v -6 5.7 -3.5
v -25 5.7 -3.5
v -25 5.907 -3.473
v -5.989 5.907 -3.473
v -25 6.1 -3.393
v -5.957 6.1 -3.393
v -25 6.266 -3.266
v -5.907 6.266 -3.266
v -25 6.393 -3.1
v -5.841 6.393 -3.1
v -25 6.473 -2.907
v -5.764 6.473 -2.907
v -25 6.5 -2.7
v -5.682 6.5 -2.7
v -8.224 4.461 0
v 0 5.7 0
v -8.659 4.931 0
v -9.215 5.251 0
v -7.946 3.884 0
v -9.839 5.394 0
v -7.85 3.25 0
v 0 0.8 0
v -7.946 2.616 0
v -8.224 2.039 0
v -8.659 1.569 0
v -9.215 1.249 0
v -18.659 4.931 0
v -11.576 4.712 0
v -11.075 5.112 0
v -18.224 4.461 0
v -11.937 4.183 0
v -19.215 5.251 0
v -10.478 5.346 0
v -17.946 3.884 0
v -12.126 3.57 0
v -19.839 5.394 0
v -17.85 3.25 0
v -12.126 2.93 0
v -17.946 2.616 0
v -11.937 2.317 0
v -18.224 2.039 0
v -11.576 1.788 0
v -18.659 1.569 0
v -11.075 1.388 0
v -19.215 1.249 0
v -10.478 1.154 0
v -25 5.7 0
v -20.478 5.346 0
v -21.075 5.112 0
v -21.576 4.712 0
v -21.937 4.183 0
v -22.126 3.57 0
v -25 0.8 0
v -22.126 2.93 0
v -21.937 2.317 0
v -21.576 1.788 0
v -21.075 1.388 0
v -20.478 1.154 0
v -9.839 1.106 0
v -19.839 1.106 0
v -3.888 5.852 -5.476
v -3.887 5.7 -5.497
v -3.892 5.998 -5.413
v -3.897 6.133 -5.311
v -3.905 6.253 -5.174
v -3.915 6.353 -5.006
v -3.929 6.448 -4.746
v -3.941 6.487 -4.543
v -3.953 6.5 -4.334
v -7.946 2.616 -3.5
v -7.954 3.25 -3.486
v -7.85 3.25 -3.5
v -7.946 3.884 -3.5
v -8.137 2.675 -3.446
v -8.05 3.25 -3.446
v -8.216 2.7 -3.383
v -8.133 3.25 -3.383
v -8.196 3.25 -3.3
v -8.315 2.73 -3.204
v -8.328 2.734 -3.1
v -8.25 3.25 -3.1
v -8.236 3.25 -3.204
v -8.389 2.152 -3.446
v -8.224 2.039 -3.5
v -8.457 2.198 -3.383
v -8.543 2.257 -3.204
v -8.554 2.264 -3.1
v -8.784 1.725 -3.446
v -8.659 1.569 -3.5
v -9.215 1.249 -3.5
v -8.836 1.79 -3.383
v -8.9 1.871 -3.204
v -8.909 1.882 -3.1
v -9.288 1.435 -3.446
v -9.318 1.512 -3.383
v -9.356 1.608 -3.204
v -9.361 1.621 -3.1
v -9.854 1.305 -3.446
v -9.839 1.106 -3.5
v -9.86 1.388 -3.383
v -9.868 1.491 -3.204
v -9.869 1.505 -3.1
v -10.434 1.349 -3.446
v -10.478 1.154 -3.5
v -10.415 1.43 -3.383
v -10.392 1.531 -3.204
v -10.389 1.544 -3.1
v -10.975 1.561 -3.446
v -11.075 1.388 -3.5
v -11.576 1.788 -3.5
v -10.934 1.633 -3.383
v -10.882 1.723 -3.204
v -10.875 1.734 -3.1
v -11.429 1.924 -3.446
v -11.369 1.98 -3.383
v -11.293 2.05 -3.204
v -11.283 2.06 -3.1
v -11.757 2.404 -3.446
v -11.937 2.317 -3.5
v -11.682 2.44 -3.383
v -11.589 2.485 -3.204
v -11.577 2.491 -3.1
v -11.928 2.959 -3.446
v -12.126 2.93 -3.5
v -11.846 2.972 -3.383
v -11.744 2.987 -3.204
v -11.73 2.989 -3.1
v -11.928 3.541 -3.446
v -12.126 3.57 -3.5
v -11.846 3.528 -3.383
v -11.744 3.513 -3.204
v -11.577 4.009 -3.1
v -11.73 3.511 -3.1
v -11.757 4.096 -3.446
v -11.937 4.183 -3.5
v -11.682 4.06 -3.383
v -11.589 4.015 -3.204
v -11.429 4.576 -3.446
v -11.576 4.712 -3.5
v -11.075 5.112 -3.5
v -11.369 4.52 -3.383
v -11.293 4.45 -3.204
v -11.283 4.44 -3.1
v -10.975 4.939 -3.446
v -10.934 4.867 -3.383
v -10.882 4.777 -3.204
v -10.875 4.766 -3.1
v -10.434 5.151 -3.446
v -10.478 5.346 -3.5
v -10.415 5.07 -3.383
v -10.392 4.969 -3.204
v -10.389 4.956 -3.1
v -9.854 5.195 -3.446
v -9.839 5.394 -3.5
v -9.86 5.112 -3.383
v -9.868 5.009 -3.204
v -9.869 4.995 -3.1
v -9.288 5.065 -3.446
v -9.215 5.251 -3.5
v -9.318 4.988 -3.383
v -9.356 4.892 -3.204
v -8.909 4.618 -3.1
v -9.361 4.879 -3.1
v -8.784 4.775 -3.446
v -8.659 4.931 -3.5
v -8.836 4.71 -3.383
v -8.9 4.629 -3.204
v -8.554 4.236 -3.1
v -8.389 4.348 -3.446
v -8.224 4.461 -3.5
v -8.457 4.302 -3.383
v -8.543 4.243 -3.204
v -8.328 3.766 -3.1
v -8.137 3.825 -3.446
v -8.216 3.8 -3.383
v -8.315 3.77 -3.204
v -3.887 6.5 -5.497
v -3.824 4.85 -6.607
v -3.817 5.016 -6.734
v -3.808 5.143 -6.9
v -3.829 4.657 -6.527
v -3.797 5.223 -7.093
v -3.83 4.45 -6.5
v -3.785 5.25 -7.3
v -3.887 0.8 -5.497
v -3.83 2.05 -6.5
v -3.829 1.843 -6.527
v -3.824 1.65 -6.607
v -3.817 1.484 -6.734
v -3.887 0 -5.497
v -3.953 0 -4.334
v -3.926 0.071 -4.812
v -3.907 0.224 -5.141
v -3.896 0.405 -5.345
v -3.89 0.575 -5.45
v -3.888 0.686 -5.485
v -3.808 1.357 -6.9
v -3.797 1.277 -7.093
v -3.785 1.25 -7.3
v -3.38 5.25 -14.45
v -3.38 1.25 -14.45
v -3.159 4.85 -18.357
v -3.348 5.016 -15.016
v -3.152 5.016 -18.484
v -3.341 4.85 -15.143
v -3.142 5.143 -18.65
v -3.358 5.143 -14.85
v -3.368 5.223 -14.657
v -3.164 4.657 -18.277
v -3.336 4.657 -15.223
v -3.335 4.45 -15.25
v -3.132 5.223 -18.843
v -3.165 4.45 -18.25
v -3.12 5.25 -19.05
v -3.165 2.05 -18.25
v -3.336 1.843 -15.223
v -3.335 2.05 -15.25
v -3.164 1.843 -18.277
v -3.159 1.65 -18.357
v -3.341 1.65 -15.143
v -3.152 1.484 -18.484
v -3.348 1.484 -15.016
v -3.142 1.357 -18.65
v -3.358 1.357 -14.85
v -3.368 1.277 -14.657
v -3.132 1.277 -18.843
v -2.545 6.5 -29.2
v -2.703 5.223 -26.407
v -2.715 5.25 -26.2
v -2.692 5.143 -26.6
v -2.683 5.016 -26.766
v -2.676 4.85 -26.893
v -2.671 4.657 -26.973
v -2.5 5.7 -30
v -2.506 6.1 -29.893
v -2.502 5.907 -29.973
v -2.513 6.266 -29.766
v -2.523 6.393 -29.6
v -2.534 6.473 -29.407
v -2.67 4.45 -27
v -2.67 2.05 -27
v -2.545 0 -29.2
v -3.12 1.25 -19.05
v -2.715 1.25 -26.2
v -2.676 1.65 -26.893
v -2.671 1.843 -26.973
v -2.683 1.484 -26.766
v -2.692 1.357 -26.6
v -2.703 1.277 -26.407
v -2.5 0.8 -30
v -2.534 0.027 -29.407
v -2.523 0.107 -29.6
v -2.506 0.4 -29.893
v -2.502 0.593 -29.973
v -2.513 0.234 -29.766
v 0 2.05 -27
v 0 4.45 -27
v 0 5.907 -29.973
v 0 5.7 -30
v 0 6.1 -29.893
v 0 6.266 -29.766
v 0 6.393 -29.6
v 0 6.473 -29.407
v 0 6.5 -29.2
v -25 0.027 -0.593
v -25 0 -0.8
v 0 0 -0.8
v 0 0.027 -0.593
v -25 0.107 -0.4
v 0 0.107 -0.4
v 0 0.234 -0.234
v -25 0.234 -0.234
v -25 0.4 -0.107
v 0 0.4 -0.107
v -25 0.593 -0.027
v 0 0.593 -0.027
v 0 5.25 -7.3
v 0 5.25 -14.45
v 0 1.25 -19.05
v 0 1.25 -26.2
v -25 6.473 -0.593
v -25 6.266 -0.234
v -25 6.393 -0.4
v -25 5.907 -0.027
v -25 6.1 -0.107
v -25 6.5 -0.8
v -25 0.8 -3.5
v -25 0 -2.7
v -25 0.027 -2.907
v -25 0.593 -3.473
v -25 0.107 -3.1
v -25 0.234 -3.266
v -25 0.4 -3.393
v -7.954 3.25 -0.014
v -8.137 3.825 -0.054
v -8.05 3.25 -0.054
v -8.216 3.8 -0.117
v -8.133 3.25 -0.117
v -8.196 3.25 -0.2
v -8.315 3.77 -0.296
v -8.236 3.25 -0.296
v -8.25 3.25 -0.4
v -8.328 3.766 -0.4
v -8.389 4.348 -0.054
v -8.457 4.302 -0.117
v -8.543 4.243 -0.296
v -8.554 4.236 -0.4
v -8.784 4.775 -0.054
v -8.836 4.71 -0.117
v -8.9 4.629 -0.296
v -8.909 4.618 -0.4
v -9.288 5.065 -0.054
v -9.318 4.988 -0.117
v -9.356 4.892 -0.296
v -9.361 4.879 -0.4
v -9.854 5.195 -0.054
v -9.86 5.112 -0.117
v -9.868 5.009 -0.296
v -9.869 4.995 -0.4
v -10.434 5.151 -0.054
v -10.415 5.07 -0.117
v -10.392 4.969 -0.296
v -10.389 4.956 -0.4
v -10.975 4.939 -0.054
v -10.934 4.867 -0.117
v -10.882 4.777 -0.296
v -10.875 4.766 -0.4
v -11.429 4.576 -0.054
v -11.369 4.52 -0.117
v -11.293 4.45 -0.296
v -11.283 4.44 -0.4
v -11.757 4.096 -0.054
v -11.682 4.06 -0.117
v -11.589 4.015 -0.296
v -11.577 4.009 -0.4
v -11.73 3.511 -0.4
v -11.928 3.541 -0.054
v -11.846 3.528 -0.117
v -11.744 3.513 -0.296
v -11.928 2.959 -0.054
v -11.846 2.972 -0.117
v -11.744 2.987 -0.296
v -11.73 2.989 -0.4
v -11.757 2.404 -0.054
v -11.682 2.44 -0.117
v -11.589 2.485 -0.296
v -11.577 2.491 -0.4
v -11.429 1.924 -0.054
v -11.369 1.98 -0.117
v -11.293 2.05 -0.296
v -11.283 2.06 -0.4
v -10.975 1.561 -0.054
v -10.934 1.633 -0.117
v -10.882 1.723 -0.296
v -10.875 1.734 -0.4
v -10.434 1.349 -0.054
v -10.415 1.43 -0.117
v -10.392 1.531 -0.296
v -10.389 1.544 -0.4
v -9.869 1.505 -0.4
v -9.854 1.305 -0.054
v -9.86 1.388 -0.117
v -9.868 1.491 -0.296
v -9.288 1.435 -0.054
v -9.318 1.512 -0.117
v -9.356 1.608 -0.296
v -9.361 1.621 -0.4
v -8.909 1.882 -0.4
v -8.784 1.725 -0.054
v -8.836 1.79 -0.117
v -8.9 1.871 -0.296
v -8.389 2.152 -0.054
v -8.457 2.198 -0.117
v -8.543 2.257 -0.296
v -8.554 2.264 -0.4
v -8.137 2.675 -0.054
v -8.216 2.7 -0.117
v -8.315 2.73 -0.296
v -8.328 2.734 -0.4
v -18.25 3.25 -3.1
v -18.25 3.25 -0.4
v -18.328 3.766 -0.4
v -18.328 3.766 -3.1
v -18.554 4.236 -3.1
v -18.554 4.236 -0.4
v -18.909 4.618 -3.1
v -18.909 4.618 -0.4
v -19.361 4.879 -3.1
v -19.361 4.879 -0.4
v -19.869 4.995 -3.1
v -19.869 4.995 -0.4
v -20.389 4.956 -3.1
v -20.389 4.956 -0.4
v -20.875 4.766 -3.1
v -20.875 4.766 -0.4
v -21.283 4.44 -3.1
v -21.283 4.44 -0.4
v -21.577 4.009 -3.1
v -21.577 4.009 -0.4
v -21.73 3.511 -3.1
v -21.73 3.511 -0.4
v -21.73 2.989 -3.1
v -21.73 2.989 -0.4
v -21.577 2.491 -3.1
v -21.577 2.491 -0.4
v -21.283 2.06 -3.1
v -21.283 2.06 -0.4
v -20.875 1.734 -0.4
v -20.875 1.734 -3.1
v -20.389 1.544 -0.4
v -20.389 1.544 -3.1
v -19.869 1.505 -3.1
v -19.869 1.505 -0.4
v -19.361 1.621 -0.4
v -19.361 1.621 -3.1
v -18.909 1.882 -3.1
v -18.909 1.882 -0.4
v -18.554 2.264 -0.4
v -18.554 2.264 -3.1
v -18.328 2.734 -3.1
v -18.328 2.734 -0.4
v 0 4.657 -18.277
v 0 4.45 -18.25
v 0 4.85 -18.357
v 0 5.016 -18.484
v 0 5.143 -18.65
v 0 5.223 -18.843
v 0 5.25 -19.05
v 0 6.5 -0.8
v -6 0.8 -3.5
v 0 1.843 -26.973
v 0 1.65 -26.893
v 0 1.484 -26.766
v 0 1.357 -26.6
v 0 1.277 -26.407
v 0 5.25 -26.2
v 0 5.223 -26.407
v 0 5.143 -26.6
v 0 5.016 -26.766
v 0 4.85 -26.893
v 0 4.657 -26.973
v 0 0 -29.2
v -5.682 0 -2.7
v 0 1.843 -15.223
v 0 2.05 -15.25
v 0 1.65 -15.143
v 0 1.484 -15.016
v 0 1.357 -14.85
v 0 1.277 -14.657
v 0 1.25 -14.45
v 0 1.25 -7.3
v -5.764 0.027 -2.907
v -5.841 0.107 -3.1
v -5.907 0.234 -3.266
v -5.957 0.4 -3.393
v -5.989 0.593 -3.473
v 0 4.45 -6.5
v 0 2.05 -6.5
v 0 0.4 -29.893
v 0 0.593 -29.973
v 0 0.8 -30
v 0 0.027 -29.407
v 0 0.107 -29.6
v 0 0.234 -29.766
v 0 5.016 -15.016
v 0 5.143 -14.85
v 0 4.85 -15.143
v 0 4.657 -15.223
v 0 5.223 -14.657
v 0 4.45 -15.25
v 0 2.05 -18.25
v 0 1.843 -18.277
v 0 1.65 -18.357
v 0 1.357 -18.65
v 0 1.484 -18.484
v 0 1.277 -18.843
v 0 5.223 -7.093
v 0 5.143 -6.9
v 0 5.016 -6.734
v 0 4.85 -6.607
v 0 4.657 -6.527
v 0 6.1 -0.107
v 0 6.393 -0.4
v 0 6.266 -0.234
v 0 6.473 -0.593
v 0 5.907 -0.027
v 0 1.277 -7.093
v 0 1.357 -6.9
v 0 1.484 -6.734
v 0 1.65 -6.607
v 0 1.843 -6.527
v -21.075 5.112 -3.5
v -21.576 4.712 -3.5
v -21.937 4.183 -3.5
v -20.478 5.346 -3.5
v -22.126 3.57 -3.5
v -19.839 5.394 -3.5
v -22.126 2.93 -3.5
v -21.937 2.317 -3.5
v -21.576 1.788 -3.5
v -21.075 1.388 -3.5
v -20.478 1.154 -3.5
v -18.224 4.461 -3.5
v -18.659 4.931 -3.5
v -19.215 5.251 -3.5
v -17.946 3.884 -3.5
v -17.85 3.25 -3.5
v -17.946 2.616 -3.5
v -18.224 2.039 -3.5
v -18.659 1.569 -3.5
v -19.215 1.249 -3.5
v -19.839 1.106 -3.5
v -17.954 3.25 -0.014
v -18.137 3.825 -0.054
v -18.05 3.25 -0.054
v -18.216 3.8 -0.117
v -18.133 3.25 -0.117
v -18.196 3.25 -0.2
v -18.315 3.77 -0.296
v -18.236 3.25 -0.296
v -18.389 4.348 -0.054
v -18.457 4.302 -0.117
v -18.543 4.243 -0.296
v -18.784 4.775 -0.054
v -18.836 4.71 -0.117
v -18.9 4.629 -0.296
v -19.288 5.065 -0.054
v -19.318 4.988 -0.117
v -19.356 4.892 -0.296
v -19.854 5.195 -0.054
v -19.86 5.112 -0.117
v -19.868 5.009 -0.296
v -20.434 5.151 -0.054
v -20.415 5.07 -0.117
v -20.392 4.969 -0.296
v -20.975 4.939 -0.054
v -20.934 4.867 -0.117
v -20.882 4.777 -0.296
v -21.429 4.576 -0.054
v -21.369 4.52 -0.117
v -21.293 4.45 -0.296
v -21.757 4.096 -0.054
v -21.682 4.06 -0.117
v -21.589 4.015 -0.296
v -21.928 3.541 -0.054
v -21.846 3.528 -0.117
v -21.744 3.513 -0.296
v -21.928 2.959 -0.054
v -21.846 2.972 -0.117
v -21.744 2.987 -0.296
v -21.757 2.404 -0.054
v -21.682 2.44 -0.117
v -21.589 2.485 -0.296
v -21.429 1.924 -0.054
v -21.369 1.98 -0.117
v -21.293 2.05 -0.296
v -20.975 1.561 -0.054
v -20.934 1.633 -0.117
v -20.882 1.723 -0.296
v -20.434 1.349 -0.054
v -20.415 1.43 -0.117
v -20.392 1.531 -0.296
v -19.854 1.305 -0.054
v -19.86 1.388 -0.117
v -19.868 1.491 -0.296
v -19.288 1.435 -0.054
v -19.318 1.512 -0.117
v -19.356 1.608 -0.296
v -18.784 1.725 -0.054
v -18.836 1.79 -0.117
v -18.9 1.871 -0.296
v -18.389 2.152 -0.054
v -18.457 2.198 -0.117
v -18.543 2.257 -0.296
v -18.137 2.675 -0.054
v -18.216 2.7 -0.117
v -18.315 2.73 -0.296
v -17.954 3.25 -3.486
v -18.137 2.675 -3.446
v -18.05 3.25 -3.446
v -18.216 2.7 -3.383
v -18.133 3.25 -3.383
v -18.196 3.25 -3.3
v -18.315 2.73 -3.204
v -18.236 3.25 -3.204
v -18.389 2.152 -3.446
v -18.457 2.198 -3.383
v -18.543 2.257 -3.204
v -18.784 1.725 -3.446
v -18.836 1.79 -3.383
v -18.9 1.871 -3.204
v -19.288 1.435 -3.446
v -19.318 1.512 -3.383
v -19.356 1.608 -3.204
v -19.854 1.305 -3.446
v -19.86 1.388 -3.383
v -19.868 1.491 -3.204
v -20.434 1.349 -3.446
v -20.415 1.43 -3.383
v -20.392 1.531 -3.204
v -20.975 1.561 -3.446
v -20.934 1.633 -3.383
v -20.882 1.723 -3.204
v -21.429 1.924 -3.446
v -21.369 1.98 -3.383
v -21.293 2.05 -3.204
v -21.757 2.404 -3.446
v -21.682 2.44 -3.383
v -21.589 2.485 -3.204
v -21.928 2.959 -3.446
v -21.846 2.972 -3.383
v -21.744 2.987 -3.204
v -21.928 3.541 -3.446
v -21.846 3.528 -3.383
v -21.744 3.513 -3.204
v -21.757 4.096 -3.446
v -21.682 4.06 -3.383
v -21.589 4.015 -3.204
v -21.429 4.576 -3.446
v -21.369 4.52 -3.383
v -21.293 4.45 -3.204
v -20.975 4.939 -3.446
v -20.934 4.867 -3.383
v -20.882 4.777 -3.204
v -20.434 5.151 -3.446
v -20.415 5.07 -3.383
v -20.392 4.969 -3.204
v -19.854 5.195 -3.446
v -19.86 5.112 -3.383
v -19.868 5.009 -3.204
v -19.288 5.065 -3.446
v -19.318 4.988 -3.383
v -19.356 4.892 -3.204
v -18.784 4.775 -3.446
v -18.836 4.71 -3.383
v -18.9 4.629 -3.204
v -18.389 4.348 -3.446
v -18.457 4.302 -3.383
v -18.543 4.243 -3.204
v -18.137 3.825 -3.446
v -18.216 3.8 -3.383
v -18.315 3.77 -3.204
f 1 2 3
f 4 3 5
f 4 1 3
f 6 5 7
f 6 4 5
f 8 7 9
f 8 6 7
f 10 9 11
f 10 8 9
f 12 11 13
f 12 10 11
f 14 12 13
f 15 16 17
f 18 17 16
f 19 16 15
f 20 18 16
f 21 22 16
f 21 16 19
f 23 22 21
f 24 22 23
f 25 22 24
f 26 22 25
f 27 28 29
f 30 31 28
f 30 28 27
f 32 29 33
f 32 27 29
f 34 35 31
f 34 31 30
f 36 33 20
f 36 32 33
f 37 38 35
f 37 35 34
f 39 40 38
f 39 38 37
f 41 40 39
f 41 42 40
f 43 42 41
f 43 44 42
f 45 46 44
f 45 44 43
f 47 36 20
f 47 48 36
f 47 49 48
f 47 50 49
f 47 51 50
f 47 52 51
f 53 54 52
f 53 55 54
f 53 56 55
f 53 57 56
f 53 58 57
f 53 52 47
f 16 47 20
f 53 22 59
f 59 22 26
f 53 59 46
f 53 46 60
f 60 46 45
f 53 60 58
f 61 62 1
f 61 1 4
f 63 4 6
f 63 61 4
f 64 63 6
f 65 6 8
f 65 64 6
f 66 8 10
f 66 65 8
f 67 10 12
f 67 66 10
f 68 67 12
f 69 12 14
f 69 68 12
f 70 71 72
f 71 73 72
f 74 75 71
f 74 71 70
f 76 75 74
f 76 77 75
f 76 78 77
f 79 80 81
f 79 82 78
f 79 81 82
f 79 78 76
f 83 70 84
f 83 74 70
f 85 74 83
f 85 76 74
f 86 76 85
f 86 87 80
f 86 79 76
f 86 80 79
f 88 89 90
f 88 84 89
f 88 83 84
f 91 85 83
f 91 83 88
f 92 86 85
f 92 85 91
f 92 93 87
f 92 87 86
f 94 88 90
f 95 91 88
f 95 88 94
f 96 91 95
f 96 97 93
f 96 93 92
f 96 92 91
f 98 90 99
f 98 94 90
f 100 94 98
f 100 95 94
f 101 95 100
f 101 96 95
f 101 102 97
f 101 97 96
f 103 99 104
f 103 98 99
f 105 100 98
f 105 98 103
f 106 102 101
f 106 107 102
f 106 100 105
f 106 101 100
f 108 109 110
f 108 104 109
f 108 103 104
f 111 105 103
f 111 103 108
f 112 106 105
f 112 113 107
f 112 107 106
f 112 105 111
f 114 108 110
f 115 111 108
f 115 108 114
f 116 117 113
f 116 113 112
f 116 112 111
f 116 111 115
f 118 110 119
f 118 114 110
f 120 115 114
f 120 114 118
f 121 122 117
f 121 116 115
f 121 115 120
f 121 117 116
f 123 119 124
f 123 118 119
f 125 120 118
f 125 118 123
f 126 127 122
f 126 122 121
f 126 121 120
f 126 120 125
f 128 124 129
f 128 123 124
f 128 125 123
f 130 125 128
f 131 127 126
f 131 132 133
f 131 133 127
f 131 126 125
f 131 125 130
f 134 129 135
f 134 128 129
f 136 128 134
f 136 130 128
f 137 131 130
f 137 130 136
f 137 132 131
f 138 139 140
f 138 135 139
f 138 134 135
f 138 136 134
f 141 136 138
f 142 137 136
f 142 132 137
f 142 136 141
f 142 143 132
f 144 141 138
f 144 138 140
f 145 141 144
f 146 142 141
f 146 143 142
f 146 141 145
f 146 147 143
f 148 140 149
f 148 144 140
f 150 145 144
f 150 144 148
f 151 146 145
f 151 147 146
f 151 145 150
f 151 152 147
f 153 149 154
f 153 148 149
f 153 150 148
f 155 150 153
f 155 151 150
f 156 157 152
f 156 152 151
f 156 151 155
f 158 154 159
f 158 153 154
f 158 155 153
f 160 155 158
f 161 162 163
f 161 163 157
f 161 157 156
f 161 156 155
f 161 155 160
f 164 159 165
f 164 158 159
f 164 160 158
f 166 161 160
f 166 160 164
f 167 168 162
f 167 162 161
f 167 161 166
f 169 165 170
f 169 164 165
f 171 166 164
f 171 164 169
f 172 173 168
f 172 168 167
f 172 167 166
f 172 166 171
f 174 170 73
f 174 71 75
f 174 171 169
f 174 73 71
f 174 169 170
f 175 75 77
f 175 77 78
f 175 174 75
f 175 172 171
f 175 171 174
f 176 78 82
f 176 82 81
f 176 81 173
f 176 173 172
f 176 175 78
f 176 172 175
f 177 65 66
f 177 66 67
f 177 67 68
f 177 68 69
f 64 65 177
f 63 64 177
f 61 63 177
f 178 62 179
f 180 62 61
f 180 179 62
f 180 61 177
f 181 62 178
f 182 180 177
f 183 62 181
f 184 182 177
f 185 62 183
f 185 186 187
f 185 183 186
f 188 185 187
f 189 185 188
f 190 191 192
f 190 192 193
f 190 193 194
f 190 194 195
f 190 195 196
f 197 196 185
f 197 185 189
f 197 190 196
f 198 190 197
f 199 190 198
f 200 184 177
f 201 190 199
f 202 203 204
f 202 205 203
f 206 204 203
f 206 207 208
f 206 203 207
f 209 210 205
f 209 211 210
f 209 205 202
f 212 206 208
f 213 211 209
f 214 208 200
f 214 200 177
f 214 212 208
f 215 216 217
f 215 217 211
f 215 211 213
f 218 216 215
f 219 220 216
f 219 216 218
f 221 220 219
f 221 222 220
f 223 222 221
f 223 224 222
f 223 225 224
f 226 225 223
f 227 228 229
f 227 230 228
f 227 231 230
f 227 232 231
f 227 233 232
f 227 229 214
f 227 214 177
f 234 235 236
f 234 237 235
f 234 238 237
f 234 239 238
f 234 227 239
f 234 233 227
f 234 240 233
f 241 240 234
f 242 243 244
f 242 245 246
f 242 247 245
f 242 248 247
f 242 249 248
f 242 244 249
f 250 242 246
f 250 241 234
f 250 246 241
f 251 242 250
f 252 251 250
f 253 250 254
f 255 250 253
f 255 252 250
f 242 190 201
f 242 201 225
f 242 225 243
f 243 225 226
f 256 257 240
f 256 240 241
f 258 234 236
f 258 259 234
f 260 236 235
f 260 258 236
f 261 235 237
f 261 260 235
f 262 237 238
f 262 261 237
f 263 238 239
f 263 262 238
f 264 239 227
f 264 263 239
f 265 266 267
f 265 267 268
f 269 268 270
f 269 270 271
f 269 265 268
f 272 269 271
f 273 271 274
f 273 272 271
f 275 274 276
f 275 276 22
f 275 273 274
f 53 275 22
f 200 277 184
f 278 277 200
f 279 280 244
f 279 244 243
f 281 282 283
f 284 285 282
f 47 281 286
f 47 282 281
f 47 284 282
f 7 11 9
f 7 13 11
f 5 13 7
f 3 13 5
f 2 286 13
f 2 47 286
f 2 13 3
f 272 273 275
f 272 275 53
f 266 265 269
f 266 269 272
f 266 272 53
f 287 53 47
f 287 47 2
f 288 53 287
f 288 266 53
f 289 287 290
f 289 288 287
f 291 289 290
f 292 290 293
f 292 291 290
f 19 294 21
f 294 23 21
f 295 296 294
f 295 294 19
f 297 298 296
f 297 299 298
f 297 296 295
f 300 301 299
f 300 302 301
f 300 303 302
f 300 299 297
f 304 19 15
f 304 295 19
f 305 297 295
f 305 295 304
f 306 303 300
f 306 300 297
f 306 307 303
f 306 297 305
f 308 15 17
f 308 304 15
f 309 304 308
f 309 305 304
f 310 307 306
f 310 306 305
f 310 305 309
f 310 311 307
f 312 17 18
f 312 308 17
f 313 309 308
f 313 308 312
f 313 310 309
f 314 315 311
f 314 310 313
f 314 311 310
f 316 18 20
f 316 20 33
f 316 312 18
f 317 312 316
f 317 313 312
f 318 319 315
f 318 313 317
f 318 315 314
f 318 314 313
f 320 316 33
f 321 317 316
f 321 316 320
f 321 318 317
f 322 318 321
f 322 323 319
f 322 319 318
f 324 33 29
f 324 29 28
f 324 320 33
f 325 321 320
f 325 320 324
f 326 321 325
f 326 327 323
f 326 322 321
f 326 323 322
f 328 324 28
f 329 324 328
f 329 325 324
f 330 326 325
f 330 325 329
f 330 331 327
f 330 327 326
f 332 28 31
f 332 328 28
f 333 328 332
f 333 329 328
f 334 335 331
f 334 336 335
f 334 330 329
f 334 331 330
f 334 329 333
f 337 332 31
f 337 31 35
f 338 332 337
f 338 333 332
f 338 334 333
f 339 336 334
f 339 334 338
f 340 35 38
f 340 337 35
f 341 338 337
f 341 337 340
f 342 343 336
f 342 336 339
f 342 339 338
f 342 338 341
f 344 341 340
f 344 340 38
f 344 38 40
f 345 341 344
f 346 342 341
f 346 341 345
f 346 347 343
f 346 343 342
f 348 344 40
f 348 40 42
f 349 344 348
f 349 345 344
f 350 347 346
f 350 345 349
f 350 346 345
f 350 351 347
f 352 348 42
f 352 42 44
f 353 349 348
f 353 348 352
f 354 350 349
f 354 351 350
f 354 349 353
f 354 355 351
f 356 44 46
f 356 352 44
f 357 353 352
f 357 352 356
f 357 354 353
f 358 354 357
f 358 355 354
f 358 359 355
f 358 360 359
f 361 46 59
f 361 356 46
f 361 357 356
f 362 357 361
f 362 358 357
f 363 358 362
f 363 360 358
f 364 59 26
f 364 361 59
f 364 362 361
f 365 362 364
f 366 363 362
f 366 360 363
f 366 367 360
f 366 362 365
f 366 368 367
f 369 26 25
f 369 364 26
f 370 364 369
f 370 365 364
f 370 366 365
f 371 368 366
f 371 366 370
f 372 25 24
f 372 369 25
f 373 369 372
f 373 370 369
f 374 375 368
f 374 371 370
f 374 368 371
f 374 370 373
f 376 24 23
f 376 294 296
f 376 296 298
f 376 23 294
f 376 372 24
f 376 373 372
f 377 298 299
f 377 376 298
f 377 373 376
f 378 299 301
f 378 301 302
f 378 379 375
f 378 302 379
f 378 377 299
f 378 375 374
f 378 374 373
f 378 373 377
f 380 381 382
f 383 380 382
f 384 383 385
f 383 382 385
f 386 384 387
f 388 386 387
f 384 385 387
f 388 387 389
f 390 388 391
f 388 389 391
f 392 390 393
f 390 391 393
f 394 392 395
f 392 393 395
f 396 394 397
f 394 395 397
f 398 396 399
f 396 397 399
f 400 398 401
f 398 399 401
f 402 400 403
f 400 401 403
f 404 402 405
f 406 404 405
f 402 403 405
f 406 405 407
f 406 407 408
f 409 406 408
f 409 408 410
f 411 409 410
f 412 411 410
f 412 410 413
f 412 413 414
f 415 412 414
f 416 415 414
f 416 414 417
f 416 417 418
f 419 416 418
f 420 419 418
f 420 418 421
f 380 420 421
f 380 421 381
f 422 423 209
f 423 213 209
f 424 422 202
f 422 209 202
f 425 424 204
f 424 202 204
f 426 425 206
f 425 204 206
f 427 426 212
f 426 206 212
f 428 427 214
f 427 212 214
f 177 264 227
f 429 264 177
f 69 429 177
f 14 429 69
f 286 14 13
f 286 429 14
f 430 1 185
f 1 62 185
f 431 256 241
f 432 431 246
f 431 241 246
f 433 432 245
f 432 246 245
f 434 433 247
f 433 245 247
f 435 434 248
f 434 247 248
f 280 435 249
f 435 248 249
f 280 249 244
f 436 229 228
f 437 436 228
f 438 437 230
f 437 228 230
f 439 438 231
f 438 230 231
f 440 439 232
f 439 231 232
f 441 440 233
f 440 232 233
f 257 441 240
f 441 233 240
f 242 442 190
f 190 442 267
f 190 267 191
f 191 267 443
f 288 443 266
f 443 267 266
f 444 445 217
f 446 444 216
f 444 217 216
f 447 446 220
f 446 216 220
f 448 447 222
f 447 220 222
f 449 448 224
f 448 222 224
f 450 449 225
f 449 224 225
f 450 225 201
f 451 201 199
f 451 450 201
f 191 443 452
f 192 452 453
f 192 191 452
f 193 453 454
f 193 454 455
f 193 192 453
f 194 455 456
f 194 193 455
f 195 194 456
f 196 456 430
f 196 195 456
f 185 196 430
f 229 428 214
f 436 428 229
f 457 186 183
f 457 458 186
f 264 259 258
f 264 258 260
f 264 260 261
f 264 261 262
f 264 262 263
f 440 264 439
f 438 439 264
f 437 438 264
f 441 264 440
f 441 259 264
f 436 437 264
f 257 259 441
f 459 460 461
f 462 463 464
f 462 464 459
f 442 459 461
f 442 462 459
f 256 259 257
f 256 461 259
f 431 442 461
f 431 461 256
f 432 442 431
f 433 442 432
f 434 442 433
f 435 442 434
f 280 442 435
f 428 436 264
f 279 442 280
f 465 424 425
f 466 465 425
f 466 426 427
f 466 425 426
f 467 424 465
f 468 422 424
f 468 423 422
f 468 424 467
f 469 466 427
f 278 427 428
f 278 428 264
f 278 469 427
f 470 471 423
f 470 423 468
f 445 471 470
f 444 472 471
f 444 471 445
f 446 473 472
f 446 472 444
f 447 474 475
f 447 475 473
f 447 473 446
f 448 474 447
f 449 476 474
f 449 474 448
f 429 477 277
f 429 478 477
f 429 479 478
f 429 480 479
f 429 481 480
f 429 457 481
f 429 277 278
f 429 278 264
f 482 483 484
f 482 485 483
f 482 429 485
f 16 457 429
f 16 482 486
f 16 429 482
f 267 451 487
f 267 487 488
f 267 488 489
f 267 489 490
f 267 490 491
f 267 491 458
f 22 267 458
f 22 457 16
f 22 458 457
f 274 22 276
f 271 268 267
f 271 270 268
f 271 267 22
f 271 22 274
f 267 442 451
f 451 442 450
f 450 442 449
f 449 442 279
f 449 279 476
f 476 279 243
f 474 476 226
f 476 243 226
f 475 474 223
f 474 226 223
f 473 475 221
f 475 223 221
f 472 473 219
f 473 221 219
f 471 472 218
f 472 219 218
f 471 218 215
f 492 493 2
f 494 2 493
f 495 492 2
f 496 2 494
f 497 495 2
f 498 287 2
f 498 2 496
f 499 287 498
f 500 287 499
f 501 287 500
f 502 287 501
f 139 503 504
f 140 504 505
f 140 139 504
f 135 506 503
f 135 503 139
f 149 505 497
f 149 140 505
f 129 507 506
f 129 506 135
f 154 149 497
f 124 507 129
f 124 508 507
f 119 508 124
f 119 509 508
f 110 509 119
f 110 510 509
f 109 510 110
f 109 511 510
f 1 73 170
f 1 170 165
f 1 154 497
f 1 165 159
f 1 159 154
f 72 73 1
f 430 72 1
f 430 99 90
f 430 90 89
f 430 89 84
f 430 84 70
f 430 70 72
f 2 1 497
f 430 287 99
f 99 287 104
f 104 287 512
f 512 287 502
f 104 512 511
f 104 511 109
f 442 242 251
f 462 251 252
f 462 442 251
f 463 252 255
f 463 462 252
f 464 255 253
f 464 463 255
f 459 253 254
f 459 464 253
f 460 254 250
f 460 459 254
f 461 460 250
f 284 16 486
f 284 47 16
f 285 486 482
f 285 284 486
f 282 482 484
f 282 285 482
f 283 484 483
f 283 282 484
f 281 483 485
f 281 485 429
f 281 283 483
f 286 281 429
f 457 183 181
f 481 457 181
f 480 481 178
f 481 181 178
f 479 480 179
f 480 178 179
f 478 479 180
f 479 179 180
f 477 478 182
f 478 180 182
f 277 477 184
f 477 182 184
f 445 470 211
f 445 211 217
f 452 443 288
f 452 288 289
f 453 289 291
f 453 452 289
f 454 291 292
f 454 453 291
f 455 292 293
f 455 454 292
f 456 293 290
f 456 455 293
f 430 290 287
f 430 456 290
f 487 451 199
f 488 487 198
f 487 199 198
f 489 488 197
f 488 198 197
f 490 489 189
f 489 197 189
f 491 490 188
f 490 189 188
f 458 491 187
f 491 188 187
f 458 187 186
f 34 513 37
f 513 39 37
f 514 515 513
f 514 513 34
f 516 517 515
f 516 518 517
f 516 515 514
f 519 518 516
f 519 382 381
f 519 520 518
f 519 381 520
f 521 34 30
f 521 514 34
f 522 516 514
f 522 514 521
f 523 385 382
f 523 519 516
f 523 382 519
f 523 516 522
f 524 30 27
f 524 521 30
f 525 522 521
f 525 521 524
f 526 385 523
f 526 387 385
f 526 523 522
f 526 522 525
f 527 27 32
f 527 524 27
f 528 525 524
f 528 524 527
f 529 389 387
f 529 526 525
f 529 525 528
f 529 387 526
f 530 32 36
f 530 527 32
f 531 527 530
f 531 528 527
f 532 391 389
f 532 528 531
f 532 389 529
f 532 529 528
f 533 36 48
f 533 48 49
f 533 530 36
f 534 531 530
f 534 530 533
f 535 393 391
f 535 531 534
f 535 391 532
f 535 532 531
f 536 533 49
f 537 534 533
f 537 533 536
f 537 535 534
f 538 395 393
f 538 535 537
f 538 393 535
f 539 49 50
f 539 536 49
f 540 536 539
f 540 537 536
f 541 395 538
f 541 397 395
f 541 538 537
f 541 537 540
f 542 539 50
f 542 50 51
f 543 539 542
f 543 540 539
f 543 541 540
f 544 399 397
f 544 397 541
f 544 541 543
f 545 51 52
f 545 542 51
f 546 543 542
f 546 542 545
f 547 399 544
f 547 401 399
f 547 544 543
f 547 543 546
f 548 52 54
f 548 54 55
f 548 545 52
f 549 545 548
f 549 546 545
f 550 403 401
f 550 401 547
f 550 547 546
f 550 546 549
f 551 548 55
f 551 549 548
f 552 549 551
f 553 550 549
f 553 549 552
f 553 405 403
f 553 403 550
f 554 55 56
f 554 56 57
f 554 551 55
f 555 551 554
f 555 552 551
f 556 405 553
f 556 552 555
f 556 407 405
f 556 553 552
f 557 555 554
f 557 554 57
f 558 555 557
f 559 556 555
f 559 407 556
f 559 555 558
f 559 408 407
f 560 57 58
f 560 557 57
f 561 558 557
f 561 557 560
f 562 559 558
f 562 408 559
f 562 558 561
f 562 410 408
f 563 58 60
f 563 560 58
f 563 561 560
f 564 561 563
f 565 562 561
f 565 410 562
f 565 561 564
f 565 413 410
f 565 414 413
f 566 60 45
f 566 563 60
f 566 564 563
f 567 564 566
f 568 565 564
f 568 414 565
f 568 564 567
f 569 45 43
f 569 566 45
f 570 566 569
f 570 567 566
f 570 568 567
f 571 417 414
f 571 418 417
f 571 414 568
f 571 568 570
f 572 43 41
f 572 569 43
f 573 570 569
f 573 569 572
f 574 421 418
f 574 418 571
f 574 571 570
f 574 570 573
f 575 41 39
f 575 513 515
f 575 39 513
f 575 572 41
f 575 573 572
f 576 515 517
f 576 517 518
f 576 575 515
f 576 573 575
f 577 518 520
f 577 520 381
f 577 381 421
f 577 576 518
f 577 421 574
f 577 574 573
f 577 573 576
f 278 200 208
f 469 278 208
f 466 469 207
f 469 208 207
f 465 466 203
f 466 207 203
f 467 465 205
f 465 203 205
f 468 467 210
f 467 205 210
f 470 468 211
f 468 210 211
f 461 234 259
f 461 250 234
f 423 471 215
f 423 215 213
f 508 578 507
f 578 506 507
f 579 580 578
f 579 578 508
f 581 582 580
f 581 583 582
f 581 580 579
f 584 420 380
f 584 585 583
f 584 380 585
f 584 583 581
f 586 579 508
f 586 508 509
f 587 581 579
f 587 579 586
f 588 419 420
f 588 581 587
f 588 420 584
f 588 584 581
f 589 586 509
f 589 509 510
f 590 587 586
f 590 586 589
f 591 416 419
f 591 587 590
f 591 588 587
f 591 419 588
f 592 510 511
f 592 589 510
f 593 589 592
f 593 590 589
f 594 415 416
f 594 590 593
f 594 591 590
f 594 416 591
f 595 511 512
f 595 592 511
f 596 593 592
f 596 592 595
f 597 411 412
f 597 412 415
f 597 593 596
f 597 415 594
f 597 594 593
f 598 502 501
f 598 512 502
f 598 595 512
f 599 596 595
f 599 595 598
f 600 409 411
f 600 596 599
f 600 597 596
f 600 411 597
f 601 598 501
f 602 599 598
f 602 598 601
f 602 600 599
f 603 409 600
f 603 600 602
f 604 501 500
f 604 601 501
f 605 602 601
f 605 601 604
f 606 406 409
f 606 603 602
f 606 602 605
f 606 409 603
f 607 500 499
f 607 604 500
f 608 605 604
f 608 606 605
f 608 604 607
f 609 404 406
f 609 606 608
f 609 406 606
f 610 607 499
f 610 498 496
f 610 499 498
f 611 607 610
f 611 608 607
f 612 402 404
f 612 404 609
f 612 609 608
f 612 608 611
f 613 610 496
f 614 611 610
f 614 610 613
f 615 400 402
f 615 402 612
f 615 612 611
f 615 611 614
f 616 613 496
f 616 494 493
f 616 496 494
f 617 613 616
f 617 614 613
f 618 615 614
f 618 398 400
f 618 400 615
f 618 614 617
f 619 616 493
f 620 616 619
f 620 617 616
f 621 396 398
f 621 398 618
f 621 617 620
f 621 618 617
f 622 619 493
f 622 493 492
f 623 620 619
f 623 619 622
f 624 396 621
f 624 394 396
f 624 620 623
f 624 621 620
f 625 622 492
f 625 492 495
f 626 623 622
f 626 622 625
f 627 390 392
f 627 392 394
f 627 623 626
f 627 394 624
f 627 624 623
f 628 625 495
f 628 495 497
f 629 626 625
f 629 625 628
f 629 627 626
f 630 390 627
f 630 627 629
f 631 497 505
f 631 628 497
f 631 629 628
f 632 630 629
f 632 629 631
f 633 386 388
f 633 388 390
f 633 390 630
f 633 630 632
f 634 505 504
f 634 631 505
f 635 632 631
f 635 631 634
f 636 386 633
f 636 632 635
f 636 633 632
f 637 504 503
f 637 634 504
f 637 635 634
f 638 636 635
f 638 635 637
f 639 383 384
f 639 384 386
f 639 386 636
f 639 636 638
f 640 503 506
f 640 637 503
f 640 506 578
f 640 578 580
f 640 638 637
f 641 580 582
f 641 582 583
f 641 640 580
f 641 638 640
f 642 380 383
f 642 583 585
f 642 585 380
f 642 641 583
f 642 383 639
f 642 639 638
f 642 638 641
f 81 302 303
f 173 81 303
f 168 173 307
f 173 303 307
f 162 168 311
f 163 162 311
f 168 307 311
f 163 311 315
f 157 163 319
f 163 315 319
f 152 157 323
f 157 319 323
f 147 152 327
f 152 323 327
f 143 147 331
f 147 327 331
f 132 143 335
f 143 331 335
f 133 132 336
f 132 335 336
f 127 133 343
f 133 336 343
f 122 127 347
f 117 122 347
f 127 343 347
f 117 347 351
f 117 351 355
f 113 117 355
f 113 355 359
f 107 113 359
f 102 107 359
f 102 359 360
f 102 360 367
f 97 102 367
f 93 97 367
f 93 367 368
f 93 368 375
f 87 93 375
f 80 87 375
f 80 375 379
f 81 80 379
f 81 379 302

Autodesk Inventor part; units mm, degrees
ref_plane "YZ Plane" through (0, 0, 0) normal (1, 0, 0) x (0, 1, 0)
ref_plane "XZ Plane" through (0, 0, 0) normal (0, 1, 0) x (-1, 0, 0)
ref_plane "XY Plane" through (0, 0, 0) normal (0, 0, 1) x (1, 0, 0)
sketch "Szkic1" plane through (0, 0, 0) normal (0, 1, 0) x (-1, 0, 0)
  line L0 (0, 0) -> (25, 0)
  line L1 (25, 0) -> (25, -3.5)
  line L2 (25, -3.5) -> (4, -3.5)
  line L3 (4, -3.5) -> (2.5, -30)
  line L4 (2.5, -30) -> (0, -30)
  line L5 (0, -30) -> (0, 0)
  dimension "d0" = 25
  dimension "d1" = 30
  dimension "d2" = 3.5
  dimension "d3" = 2.5
  dimension "d4" = 4
extrude "Wyciągnięcie proste1" add sketch "Szkic1" along normal blind 6.5
sketch "Szkic2" plane through (0, 0, 0) normal (1, 0, 0) x (0, 0, -1)
  line L0 (0, 0) -> (30, 0) projected
  line L1 (30, 0) -> (30, 6.5) projected
  line L2 (0, 6.5) -> (30, 6.5) projected
  line L3 (0, 0) -> (0, 6.5) projected
  line L4 (30, 3.25) -> (0, 3.25) construction
  line L5 (18.25, 5.25) -> (27, 5.25)
  line L6 (27, 5.25) -> (27, 1.25)
  line L7 (27, 1.25) -> (18.25, 1.25)
  line L8 (18.25, 1.25) -> (18.25, 5.25)
  line L9 (18.25, 5.25) -> (27, 1.25) construction
  line L10 (27, 5.25) -> (18.25, 1.25) construction
  line L11 (6.5, 5.25) -> (15.25, 5.25)
  line L12 (15.25, 5.25) -> (15.25, 1.25)
  line L13 (15.25, 1.25) -> (6.5, 1.25)
  line L14 (6.5, 1.25) -> (6.5, 5.25)
  line L15 (6.5, 5.25) -> (15.25, 1.25) construction
  line L16 (15.25, 5.25) -> (6.5, 1.25) construction
  line L17 (3.5, 0) -> (3.5, 6.5) projected
  point P0 (22.625, 3.25)
  point P1 (10.875, 3.25)
  dimension "d7" = 26.5
  dimension "d8" = 3
  dimension "d9" = 3
  dimension "d10" = 3
  dimension "d11" = 4
extrude "Wyciągnięcie proste2" cut sketch "Szkic2" against normal up to surface contours L5 L6 L7 L8 | L11 L12 L13 L14 surface through (-2.5, 0, -30) normal (-0.9984018, 0, -0.0565133)
sketch "Szkic3" plane through (-25, 0, 0) normal (0, 0, 1) x (1, 0, 0)
  line L0 (0, 0) -> (25, 0) projected
  line L1 (25, 0) -> (25, 6.5) projected
  line L2 (0, 6.5) -> (25, 6.5) construction
  line L3 (0, 0) -> (0, 6.5) projected
  line L4 (0, 3.25) -> (25, 3.25) construction
  circle A0 centre (15, 3.25) radius 1.75
  circle A1 centre (5, 3.25) radius 1.75
  dimension "d14" = 3.5
  dimension "d15" = 10
  dimension "d16" = 10
extrude "Wyciągnięcie proste3" cut sketch "Szkic3" against normal up to surface (3.5 mm away)
chamfer "Faza1" distance 2 angle 45 1 edges at (-4, 3.25, -3.5)
fillet "Zaokrąglenie1" radius 0.8 16 edges at (-1.25, 6.5, -30) (-1.25, 0, -30) (-12.5, 6.5, 0) (-12.5, 0, 0) (-15.5, 0, -3.5) (-15.5, 6.5, -3.5) (-4.9435, 6.5, -4.4984) (-4.9435, 0, -4.4984) (-1.3349, 5.25, -27) (-1.5825, 5.25, -18.25) (-1.3349, 1.25, -27) (-1.5825, 1.25, -18.25) (-1.6675, 5.25, -15.25) (-1.6675, 1.25, -15.25) (-1.9151, 1.25, -6.5) (-1.9151, 5.25, -6.5)
fillet "Zaokrąglenie2" radius 0.4 4 edges at (-11.75, 3.25, -3.5) (-21.75, 3.25, -3.5) (-11.75, 3.25, 0) (-21.75, 3.25, 0)
equation "\"d9\" = d8"
properties part number "noga1"
